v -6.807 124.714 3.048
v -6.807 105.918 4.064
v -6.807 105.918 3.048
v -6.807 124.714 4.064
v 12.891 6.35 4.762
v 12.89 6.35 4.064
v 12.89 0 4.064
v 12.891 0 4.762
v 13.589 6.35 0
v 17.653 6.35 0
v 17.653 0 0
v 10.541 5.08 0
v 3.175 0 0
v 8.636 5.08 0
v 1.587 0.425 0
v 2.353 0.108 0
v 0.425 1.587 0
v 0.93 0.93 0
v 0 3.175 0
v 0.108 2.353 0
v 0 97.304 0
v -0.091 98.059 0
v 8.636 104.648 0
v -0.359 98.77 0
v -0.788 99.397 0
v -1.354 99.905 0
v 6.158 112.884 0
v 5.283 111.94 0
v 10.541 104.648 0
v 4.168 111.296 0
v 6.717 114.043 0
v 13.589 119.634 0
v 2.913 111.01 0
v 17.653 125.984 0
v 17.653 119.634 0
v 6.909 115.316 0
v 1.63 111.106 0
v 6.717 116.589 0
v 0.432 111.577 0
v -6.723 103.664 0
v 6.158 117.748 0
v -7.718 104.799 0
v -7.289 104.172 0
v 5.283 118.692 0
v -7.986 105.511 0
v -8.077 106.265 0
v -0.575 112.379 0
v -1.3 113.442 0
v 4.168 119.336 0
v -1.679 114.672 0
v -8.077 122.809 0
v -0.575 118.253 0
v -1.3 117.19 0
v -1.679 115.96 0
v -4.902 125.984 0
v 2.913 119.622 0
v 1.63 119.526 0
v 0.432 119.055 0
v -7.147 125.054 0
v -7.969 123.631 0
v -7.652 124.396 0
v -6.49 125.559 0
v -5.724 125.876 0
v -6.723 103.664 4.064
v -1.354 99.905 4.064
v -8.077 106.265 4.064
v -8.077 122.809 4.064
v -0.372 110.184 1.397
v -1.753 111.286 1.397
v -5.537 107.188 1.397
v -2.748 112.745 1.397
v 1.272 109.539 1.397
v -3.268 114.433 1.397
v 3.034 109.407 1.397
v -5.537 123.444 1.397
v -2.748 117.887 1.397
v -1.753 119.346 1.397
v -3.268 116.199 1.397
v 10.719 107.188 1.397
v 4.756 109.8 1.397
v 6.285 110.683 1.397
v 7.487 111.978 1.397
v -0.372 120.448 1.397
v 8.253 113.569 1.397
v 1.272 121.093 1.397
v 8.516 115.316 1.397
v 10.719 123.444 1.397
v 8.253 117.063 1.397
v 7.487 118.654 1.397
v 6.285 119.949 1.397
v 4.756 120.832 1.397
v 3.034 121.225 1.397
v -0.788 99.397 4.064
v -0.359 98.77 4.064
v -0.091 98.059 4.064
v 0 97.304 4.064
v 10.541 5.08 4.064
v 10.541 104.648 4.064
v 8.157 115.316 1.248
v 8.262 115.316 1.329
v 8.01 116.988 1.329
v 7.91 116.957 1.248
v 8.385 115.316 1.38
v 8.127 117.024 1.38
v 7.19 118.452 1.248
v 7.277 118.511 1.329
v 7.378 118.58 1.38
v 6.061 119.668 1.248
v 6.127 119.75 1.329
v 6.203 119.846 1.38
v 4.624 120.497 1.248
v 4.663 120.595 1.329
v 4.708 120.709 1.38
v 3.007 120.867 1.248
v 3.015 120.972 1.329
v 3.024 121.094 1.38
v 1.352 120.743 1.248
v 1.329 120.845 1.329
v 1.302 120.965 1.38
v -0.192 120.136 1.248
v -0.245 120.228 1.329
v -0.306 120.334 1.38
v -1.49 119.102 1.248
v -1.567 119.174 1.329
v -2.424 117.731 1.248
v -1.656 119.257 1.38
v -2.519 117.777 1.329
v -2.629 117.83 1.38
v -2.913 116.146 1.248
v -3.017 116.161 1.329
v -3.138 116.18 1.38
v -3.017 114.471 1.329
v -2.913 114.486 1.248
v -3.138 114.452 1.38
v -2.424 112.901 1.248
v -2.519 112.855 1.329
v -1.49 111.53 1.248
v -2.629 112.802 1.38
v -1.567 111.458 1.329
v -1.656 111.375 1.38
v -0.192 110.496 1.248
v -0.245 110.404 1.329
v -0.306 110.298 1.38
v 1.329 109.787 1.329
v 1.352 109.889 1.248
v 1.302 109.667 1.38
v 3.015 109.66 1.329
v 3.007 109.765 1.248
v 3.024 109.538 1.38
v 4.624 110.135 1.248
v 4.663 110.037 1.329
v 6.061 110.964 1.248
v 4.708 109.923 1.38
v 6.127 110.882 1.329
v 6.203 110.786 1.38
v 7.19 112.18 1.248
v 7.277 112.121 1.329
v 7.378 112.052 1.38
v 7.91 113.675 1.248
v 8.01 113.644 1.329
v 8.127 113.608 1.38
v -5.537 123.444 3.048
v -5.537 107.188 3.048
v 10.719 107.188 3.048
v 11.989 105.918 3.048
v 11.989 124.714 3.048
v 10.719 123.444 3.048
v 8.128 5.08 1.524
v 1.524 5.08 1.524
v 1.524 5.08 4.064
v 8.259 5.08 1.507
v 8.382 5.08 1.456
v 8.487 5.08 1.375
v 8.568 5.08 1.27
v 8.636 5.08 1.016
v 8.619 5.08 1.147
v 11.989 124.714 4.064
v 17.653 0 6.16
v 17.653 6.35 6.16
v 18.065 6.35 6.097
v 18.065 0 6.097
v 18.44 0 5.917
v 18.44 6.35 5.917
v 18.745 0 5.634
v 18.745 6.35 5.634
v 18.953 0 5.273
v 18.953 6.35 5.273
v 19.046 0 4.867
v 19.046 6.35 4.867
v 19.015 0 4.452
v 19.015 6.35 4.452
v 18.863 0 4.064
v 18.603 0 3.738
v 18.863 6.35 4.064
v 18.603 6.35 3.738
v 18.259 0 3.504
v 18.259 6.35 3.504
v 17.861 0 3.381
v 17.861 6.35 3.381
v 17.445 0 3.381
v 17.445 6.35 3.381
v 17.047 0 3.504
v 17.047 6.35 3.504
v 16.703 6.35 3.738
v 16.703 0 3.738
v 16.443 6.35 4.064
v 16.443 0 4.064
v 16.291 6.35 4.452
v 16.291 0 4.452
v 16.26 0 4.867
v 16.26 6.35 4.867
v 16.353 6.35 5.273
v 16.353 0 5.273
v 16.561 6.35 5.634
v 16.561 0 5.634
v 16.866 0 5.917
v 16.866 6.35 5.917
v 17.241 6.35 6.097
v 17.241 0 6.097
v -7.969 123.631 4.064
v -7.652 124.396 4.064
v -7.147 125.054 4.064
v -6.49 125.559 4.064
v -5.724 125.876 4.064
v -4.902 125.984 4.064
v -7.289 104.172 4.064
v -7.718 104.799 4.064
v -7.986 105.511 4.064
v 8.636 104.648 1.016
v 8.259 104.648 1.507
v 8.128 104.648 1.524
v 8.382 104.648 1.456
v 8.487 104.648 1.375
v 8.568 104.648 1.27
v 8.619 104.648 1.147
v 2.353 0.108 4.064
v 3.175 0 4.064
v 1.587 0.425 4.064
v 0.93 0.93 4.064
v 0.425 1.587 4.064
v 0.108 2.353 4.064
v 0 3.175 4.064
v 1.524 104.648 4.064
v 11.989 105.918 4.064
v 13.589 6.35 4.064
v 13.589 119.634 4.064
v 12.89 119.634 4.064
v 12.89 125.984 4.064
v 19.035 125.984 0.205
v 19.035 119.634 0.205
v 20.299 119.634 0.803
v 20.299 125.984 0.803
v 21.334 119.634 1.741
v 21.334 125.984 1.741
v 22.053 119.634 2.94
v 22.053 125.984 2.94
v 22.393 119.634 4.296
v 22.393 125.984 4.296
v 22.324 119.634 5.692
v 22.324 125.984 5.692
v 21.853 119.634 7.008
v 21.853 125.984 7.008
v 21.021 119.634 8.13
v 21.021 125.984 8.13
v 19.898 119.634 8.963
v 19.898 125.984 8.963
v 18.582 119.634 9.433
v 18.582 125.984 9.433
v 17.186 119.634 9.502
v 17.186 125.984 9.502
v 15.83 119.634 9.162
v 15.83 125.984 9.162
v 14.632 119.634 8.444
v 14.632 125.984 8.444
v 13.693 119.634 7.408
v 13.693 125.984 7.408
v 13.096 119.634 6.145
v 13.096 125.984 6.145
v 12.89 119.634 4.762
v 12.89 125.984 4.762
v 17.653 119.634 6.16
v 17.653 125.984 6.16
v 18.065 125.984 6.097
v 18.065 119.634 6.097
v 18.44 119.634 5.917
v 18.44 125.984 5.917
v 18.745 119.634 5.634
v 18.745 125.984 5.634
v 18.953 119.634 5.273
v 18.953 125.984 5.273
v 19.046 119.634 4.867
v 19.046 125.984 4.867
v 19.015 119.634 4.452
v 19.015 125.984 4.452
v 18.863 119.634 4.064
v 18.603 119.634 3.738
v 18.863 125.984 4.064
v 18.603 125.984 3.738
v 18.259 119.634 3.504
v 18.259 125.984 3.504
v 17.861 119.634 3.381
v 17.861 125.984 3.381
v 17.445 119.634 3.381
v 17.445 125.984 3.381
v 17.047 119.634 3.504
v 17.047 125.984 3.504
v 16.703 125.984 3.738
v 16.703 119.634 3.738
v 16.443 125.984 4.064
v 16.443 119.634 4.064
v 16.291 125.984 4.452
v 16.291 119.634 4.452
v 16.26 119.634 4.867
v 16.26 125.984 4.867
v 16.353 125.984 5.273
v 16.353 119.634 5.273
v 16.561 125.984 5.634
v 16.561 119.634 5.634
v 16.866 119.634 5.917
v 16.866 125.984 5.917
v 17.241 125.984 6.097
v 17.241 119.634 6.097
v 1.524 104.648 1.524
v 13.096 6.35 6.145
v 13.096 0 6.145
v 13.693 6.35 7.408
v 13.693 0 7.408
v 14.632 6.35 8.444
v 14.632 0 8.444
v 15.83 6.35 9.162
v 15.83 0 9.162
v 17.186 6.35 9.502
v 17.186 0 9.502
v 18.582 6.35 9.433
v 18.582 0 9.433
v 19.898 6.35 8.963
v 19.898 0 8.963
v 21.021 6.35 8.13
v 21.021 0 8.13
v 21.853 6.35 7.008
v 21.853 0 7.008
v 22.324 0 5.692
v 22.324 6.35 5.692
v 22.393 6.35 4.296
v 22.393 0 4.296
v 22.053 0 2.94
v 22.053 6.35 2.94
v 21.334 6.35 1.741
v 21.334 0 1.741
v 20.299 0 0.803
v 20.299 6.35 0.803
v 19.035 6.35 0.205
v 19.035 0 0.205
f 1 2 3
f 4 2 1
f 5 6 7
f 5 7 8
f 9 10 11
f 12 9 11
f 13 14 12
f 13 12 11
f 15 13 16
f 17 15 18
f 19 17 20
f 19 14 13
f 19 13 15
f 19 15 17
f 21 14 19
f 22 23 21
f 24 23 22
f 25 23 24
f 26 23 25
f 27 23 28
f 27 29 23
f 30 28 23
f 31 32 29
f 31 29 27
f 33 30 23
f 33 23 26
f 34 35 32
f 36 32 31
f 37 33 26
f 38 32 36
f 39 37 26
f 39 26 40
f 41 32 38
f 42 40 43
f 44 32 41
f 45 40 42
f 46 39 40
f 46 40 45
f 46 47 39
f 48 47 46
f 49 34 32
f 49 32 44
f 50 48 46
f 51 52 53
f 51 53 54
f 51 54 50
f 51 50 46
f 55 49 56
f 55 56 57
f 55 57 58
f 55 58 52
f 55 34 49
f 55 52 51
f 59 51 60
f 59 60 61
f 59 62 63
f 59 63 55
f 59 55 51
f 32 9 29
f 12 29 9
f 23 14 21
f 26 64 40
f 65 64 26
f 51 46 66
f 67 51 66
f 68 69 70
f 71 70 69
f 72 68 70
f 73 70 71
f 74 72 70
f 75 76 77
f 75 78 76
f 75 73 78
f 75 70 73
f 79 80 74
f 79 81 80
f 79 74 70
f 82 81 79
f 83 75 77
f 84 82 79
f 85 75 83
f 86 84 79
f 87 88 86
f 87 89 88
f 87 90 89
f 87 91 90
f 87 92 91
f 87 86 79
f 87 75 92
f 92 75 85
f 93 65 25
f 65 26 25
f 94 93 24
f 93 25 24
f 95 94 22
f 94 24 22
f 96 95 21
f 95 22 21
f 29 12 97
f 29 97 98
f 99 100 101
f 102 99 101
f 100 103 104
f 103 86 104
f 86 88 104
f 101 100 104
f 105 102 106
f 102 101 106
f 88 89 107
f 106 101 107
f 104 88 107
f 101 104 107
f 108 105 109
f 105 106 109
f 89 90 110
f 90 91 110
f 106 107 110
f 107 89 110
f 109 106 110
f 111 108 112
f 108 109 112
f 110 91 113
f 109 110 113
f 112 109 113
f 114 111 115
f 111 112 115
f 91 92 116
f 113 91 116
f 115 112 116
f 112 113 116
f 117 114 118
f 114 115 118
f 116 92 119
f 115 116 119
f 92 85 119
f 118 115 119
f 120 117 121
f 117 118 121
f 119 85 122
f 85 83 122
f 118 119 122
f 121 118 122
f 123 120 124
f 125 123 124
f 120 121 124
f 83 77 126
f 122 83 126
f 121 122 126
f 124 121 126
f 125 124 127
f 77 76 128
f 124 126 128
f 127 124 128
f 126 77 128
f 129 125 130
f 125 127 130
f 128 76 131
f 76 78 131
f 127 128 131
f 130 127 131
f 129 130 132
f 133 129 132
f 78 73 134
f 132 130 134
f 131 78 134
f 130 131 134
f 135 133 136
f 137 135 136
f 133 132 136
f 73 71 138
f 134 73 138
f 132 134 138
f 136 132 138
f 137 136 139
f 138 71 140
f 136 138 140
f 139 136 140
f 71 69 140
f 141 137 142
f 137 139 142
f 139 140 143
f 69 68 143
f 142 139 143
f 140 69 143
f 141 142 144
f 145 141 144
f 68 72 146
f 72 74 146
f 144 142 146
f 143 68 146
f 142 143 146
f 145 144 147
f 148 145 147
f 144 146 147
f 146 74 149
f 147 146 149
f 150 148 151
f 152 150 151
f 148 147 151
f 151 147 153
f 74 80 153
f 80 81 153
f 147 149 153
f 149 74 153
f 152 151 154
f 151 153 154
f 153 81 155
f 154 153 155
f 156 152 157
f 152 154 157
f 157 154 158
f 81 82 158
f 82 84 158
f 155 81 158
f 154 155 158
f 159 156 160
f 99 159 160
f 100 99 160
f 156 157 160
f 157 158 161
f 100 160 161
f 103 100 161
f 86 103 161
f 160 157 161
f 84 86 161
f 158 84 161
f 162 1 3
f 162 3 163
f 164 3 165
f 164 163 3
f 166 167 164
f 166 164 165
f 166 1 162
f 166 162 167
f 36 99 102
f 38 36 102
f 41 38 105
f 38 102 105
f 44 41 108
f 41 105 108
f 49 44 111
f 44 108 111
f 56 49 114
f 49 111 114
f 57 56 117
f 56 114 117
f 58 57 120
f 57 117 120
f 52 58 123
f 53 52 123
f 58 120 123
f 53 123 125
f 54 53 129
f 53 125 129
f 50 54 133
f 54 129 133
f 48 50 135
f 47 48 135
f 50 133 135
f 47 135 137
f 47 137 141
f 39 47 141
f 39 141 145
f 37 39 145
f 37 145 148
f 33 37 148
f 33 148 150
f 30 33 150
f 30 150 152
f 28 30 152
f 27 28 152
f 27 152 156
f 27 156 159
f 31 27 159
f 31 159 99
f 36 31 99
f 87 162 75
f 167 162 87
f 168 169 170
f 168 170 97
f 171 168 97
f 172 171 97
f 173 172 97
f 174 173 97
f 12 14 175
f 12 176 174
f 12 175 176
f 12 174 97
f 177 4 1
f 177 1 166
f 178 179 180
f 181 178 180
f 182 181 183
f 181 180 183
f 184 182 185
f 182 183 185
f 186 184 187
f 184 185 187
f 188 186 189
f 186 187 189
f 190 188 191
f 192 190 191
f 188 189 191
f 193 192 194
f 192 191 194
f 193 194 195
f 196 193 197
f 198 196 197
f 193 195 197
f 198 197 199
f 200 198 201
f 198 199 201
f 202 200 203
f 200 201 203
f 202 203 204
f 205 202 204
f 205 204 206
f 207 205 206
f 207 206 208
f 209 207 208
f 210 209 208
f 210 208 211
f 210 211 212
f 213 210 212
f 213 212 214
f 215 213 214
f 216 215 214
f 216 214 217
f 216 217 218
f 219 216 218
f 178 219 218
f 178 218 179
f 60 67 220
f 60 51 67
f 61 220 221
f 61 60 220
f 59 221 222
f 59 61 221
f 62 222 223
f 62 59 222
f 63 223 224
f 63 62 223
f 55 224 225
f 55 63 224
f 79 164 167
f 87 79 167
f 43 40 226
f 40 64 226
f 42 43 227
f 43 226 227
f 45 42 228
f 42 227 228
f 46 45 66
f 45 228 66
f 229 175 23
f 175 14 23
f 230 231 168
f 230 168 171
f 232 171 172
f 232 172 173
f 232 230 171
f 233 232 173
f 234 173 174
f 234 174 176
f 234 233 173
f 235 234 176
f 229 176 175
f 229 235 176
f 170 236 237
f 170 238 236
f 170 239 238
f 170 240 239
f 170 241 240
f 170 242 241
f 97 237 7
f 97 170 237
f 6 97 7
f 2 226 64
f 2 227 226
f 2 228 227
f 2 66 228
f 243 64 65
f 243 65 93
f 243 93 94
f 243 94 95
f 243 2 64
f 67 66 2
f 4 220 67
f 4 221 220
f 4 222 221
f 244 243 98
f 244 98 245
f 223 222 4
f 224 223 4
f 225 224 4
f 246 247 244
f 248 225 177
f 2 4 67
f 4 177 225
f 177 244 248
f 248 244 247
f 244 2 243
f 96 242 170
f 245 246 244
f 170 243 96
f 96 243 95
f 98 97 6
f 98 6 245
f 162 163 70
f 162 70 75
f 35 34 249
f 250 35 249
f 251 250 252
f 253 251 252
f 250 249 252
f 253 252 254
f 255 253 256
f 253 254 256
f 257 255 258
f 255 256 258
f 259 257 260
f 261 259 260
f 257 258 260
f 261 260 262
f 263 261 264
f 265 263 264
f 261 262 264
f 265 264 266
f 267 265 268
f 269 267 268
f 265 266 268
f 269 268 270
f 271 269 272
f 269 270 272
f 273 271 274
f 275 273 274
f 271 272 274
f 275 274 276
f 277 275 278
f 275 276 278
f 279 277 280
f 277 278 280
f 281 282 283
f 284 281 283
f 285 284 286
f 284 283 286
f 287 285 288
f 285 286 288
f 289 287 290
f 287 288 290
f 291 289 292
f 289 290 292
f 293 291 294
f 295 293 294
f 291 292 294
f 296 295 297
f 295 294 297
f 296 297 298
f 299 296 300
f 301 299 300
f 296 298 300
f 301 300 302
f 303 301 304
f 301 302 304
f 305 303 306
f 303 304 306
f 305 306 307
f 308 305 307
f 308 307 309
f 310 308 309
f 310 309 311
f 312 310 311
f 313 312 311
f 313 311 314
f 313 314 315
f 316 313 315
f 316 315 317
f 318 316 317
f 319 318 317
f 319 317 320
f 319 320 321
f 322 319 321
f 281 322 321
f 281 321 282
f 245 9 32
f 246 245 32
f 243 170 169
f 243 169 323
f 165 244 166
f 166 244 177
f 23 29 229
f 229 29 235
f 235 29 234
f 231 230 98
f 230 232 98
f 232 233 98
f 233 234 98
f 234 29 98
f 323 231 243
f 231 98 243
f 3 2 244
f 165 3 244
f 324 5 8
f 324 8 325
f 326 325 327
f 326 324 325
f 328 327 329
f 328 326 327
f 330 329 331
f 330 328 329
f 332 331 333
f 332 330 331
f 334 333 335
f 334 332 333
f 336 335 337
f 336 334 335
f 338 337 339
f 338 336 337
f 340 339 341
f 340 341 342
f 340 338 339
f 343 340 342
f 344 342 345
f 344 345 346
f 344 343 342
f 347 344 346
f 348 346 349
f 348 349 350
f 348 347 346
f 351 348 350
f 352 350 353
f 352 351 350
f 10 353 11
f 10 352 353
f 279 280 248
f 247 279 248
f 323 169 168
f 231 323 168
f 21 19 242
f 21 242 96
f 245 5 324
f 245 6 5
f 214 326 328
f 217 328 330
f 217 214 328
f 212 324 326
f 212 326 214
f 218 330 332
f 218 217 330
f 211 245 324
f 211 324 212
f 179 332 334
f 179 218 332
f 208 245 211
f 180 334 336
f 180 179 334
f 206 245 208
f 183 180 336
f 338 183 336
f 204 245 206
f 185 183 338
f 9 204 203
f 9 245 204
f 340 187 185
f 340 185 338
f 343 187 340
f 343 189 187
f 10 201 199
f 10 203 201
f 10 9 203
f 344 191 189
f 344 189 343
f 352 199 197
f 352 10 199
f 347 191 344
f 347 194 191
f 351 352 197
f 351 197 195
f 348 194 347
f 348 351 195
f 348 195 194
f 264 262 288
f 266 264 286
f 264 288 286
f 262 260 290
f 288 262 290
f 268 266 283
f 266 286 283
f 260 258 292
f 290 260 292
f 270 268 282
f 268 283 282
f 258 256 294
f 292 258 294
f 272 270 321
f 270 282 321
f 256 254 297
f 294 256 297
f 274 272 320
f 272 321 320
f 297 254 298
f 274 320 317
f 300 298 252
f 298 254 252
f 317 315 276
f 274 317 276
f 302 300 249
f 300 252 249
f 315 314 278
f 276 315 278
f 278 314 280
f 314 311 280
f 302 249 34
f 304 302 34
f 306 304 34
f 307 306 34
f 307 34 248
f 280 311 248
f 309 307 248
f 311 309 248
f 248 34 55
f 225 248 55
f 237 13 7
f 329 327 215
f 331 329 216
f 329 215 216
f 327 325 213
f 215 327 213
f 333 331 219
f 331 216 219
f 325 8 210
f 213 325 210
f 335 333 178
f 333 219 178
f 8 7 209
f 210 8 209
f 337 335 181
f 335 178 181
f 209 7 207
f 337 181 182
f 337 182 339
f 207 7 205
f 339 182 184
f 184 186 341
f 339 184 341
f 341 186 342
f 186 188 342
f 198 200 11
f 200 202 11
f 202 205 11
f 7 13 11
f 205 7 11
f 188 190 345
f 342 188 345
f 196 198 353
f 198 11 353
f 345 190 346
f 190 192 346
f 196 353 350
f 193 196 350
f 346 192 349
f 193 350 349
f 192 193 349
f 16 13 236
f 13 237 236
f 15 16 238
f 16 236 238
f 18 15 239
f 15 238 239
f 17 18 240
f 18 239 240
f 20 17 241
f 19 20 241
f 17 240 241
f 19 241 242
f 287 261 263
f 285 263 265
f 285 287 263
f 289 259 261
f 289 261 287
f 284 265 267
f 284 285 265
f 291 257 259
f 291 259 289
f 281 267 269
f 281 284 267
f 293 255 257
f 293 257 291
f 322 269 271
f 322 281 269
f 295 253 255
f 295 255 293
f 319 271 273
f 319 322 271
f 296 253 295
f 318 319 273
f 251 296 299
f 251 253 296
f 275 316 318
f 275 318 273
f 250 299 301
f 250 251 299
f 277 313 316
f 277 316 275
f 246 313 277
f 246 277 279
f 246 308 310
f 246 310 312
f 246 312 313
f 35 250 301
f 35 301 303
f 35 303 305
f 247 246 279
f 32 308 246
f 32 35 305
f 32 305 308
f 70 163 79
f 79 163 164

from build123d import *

# Parameters (mm, degrees)
SKETCH1_W           = 15.875
SKETCH1_H           = 125.984
SKETCH1_W_2         = 1.905
SKETCH1_H_2         = 115.824
BOSS_EXTRUDE1_DEPTH = 4.064
SKETCH2_W           = 7.112
SKETCH2_H           = 115.824
CUT_EXTRUDE1_DEPTH  = 2.54
FILLET1_R           = 0.508
BOSS_EXTRUDE2_START = -4.064
SKETCH3_W           = 23.9522
SKETCH3_H           = 21.336
BOSS_EXTRUDE2_DEPTH = 4.064
SKETCH4_W           = 16.256
SKETCH4_H           = 16.256
CUT_EXTRUDE2_DEPTH  = 2.667
SKETCH5_W           = 18.796
SKETCH5_H           = 18.796
CUT_EXTRUDE3_DEPTH  = 1.016
SKETCH6_R           = 5.715
CUT_EXTRUDE4_DEPTH  = 2.54
CUT_EXTRUDE4_DRAFT  = -45
CHAMFER1_SIZE       = 8.128
CHAMFER1_SIZE_2     = 5.691286871
FILLET3_R           = 3.175
FILLET4_R           = 0.508
SKETCH7_W           = 2.286
SKETCH7_H           = 113.284
CUT_EXTRUDE5_DEPTH  = 128.045267433
BOSS_EXTRUDE3_DEPTH = 6.35
BOSS_EXTRUDE4_DEPTH = 6.35
SKETCH10_R          = 1.397
CUT_EXTRUDE6_DEPTH  = 129.316594879


with BuildPart() as part:
    # Sketch1 → Boss-Extrude1 (new body)
    with BuildSketch(Plane.XY):
        with Locations((7.9375, 62.992)):
            Rectangle(SKETCH1_W, SKETCH1_H)
        with Locations((9.5885, 62.992)):
            Rectangle(SKETCH1_W_2, SKETCH1_H_2, mode=Mode.SUBTRACT)
    extrude(amount=BOSS_EXTRUDE1_DEPTH)

    # Sketch2 → Cut-Extrude1 (cut)
    with BuildSketch(Plane.XY.offset(4.064)):
        with Locations((5.08, 62.992)):
            Rectangle(SKETCH2_W, SKETCH2_H)
    extrude(amount=-CUT_EXTRUDE1_DEPTH, mode=Mode.SUBTRACT)

    # Fillet1
    fillet1_edges = [part.edges().sort_by_distance(p)[0] for p in [
        (8.636, 62.992, 1.524),
    ]]
    fillet(fillet1_edges, radius=FILLET1_R)

    # Sketch3 → Boss-Extrude2 (add)
    with BuildSketch(Plane(origin=(0, 0, 0), x_dir=(-1, 0, 0), z_dir=(0, 0, -1)).offset(BOSS_EXTRUDE2_START)):
        with Locations((-3.8989, 115.316)):
            Rectangle(SKETCH3_W, SKETCH3_H)
    extrude(amount=BOSS_EXTRUDE2_DEPTH)

    # Sketch4 → Cut-Extrude2 (cut)
    with BuildSketch(Plane.XY.offset(4.064)):
        with Locations((2.5908, 115.316)):
            Rectangle(SKETCH4_W, SKETCH4_H)
    extrude(amount=-CUT_EXTRUDE2_DEPTH, mode=Mode.SUBTRACT)

    # Sketch5 → Cut-Extrude3 (cut)
    with BuildSketch(Plane.XY.offset(4.064)):
        with Locations((2.5908, 115.316)):
            Rectangle(SKETCH5_W, SKETCH5_H)
    extrude(amount=-CUT_EXTRUDE3_DEPTH, mode=Mode.SUBTRACT)


with BuildPart() as cut_extrude4_tool:
    # Sketch6 → Cut-Extrude4 (with draft: the straight prism first)
    with BuildSketch(Plane.XY.offset(1.397)):
        with Locations((2.5908, 115.316)):
            Circle(SKETCH6_R)
    extrude(amount=-CUT_EXTRUDE4_DEPTH)
    # Cut-Extrude4: the draft: its side faces are tilted about the plane it starts from
    cut_extrude4_sides = [cut_extrude4_tool.faces().sort_by_distance(p)[0] for p in [
        (-3.1242, 115.316, 0.127),
    ]]
    draft(cut_extrude4_sides, Plane.XY.offset(1.397), CUT_EXTRUDE4_DRAFT)


with BuildPart() as part_1:
    add(part.part)

    # Cut-Extrude4: cut by cut_extrude4_tool
    add(cut_extrude4_tool.part, mode=Mode.SUBTRACT)

    # Chamfer1
    # the kernel refuses this chamfer: 8.128, 5.691286871 mm, written as the material it adds along each edge
    with BuildSketch(Plane(origin=(0, 104.648, 4.064), x_dir=(-0.9997533347641298, 0.022209674198457242, 0), z_dir=(0, 0, -1))) as chamfer1_piece_1_section:
        Polygon((CHAMFER1_SIZE * 0.999753334764, -CHAMFER1_SIZE * 0.0222096741985), (-CHAMFER1_SIZE_2 * 0.0222096741968, -CHAMFER1_SIZE_2 * 0.999753334688), (0, 0), align=None)
    chamfer1_piece_1 = extrude(amount=4.064, mode=Mode.PRIVATE)
    chamfer1_piece_1 = split(chamfer1_piece_1, bisect_by=Plane(origin=(-8.0772, 102.794358519, 2.032), z_dir=(1, 0, 0)), keep=Keep.TOP, mode=Mode.PRIVATE)
    add(chamfer1_piece_1)

    # Fillet3
    fillet3_edges = [part_1.edges().sort_by_distance(p)[0] for p in [
        (0, 98.956713129, 2.032),
        (-8.0772, 104.612429457, 2.032),
        (-8.0772, 125.984, 2.032),
        (0, 0, 2.032),
    ]]
    fillet(fillet3_edges, radius=FILLET3_R)

    # Fillet4
    fillet4_edges = [part_1.edges().sort_by_distance(p)[0] for p in [
        (-3.1242, 115.316, 1.397),
    ]]
    fillet(fillet4_edges, radius=FILLET4_R)

    # Sketch7 → Cut-Extrude5 (cut, through all)
    with BuildSketch(Plane(origin=(0, 0, 0), x_dir=(-1, 0, 0), z_dir=(0, 0, -1))):
        with Locations((-14.732, 62.992)):
            Rectangle(SKETCH7_W, SKETCH7_H)
    extrude(amount=-CUT_EXTRUDE5_DEPTH, mode=Mode.SUBTRACT)

    # Sketch8 → Boss-Extrude3 (add)
    with BuildSketch(Plane(origin=(0, 125.984, 0), x_dir=(1, 0, 0), z_dir=(0, 1, 0))):
        with BuildLine():
            Line((15.875, 0), (17.653, 0))
            ThreePointArc((17.653, 0), (21.020596045, -8.130096045), (12.8905, -4.7625))
            Line((12.8905, -4.7625), (12.8905, -4.064))
            Line((12.8905, -4.064), (15.875, -4.064))
            Line((15.875, -4.064), (15.875, 0))
        make_face()
    extrude(amount=-BOSS_EXTRUDE3_DEPTH)

    # Sketch9 → Boss-Extrude4 (add)
    with BuildSketch(Plane(origin=(0, 6.35, 0), x_dir=(1, 0, 0), z_dir=(0, 1, 0))):
        with BuildLine():
            Line((17.653, 0), (13.589, 0))
            Line((13.589, 0), (13.589, -4.064))
            Line((13.589, -4.064), (12.8905, -4.064))
            Line((12.8905, -4.064), (12.8905, -4.7625))
            ThreePointArc((12.8905, -4.7625), (21.020596045, -8.130096045), (17.653, 0))
        make_face()
    extrude(amount=-BOSS_EXTRUDE4_DEPTH)

    # Sketch10 → Cut-Extrude6 (cut, through all)
    with BuildSketch(Plane(origin=(0, 125.984, 0), x_dir=(1, 0, 0), z_dir=(0, 1, 0))):
        with Locations(Location((17.653, -4.7625, 0), (0, 0, 270))):
            Circle(SKETCH10_R)
    extrude(amount=-CUT_EXTRUDE6_DEPTH, mode=Mode.SUBTRACT)


solid = part_1.part
